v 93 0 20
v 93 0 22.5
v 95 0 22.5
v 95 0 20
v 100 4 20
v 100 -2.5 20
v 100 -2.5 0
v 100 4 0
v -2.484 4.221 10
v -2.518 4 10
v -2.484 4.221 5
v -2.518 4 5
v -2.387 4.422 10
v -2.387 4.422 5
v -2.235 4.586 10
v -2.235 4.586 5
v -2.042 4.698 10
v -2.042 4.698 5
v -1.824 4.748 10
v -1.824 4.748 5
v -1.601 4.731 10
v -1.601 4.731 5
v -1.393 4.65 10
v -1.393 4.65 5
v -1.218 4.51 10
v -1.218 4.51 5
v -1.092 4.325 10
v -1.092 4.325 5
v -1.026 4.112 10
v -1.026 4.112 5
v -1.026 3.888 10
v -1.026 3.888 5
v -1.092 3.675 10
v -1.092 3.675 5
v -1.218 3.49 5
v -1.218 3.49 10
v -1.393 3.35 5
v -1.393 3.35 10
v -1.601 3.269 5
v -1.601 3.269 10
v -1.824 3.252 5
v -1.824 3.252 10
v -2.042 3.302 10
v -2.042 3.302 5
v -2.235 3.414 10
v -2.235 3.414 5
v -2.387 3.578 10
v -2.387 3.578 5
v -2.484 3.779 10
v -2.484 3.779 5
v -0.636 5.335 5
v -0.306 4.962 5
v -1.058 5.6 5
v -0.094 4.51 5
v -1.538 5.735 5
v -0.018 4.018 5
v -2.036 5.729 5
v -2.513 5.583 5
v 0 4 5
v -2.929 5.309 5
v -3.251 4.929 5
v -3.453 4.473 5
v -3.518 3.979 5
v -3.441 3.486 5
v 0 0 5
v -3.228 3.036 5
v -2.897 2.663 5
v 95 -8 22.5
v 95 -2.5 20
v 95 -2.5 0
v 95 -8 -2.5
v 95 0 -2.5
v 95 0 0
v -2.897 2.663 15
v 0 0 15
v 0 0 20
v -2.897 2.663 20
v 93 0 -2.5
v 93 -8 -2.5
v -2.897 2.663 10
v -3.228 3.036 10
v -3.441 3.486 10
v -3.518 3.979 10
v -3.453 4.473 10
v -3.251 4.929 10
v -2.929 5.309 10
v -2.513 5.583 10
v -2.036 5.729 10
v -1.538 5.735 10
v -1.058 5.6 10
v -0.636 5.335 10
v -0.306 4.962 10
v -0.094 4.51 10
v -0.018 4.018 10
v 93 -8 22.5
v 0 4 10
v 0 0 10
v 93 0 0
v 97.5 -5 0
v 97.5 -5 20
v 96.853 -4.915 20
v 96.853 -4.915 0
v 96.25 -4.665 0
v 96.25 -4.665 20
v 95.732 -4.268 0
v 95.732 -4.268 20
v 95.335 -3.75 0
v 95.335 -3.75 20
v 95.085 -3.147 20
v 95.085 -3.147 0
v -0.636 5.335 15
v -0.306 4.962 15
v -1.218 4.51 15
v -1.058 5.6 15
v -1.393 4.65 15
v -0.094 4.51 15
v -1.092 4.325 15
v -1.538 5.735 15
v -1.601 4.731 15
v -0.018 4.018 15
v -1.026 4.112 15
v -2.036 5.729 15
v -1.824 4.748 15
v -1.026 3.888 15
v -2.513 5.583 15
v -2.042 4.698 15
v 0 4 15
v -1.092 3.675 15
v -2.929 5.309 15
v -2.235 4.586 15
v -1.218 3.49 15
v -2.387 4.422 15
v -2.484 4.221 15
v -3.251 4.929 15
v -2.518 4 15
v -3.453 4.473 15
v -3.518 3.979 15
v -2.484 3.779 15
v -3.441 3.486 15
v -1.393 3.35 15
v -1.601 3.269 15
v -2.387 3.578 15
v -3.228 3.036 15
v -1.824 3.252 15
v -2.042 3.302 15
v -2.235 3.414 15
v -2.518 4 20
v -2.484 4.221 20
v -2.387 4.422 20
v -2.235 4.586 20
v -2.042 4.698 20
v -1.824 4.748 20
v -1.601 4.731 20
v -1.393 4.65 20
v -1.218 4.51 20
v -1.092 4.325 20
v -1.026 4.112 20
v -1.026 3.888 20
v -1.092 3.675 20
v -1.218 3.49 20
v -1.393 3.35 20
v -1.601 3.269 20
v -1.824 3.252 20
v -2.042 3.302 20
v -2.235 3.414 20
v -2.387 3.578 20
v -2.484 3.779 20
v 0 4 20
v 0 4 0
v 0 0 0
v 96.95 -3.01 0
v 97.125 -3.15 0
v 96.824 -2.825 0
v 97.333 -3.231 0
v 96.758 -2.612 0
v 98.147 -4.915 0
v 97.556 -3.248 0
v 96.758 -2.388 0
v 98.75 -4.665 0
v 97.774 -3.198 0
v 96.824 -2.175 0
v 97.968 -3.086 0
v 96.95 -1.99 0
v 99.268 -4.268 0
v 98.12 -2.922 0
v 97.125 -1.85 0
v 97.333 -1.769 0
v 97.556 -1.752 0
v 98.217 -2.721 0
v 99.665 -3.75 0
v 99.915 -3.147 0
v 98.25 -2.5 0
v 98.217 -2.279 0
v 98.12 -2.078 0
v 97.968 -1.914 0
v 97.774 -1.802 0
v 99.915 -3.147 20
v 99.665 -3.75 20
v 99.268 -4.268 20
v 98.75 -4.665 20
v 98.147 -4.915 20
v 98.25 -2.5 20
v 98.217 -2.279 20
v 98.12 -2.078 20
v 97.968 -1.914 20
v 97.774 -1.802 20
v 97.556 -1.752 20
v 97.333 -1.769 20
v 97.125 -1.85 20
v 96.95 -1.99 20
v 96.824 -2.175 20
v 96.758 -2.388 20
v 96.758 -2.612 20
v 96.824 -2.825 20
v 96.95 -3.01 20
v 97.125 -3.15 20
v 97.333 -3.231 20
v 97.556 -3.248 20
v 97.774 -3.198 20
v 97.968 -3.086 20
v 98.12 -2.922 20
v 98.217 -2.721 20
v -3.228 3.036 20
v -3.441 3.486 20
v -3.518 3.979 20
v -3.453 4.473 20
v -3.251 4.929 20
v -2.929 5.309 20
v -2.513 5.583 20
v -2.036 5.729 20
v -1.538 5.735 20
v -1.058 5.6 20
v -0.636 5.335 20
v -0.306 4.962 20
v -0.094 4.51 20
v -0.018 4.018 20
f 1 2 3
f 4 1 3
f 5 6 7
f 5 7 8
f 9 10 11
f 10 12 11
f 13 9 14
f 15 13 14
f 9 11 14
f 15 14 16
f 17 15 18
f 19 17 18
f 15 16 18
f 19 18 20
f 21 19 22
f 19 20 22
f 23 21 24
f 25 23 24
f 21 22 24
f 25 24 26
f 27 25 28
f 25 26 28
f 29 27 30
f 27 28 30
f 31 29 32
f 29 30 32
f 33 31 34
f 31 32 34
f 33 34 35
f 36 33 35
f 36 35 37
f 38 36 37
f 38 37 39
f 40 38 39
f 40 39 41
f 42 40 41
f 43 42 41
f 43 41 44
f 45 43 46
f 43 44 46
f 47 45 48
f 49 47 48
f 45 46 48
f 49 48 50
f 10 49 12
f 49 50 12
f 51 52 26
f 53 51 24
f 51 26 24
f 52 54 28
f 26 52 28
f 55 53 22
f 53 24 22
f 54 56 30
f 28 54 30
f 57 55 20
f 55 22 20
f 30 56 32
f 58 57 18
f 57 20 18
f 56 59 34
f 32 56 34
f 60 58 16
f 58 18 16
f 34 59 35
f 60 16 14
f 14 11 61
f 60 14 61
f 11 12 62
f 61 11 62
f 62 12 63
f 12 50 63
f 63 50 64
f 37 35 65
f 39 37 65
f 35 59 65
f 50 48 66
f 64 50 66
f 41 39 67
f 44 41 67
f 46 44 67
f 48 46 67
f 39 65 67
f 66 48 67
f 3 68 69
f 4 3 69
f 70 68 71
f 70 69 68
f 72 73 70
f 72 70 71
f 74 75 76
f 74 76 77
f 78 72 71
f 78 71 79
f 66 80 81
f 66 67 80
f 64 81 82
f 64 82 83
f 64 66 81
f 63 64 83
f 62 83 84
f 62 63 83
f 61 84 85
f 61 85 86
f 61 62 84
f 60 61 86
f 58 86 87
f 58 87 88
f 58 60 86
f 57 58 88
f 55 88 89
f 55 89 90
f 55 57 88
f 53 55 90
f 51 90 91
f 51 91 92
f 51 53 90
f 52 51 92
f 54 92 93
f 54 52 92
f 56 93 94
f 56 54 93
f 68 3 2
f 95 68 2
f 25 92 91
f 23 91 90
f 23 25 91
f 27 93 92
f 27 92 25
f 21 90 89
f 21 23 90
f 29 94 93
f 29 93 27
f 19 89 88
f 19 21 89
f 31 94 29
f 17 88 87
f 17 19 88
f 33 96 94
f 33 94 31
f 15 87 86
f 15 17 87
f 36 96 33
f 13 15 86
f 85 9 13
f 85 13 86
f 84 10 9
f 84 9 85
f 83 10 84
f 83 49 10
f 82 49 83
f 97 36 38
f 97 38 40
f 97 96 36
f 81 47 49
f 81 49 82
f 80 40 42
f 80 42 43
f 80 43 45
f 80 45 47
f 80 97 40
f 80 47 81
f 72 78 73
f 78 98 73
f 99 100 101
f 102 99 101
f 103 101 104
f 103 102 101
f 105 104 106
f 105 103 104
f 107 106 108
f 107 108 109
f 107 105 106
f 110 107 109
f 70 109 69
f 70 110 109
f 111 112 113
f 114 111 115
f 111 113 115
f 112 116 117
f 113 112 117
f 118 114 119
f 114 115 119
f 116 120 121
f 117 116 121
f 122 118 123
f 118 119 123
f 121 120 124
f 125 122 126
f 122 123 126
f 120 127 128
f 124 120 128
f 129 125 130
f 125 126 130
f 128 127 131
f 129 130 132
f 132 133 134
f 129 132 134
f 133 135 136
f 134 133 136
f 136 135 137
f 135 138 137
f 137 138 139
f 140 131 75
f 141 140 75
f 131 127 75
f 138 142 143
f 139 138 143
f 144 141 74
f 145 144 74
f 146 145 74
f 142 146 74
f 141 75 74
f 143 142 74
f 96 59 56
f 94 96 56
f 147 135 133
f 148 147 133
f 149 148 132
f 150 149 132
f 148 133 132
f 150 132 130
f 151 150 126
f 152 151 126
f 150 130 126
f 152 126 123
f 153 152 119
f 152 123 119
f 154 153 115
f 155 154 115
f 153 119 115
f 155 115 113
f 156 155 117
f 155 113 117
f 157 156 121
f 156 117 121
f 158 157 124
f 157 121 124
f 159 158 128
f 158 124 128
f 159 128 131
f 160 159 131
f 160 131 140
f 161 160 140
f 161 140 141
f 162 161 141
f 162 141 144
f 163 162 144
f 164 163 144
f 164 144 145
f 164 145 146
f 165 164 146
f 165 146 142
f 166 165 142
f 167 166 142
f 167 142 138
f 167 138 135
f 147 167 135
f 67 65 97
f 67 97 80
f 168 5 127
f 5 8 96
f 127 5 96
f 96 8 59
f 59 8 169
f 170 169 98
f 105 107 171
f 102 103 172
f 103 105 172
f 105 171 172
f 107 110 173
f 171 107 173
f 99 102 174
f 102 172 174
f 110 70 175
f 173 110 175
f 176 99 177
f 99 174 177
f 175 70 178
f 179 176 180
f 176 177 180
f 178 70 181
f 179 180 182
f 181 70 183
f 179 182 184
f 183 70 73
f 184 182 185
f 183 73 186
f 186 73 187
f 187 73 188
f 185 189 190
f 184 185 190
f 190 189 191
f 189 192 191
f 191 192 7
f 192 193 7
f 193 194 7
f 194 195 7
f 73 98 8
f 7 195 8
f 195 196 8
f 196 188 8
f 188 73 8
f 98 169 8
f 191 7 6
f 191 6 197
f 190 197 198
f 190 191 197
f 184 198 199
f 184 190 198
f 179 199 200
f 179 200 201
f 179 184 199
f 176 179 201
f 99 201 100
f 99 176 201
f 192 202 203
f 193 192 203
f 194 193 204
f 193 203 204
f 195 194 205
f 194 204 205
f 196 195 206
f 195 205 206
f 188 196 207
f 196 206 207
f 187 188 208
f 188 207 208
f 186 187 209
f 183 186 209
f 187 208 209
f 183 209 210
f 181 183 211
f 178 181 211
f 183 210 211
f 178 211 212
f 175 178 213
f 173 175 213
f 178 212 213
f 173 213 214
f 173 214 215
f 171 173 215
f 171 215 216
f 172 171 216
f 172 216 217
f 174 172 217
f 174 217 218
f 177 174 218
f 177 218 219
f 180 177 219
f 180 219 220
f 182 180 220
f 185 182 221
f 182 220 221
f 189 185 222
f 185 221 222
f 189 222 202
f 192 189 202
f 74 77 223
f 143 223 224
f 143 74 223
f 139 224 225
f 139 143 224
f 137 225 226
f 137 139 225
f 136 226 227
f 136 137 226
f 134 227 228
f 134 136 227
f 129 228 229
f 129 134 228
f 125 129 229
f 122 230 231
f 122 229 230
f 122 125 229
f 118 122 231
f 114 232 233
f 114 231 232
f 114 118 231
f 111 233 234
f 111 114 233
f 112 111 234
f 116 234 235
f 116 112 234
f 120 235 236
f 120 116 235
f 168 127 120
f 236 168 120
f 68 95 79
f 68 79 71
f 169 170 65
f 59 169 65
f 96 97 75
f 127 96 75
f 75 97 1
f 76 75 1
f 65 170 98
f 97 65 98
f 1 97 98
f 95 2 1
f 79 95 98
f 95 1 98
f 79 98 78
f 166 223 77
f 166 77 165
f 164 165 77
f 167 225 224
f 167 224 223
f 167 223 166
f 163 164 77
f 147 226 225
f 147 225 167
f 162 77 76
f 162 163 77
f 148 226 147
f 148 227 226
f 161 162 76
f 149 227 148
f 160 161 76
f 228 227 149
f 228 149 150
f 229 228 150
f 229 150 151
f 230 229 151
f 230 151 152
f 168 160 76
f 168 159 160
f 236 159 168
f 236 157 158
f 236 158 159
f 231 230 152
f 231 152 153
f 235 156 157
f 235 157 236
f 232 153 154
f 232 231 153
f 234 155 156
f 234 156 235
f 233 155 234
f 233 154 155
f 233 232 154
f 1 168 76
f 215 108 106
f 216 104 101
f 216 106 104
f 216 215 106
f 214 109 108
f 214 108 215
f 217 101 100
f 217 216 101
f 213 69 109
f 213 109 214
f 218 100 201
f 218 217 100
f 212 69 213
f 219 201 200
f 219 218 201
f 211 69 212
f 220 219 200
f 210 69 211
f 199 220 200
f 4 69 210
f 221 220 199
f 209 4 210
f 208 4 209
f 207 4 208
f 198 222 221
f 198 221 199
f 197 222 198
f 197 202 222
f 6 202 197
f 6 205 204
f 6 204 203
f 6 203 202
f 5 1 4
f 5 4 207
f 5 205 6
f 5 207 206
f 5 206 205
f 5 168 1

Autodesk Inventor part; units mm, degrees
ref_plane "YZ Plane" through (0, 0, 0) normal (1, 0, 0) x (0, 1, 0)
ref_plane "XZ Plane" through (0, 0, 0) normal (0, 1, 0) x (-1, 0, 0)
sketch "Skizze1" plane through (0, 0, 0) normal (0, 0, 1) x (1, 0, 0)
  line L0 (0, 0) -> (100, 0)
  line L1 (100, 0) -> (100, 4)
  line L2 (100, 4) -> (0, 4)
  line L3 (0, 4) -> (0, 0)
  dimension "d0" = 100
  dimension "d1" = 4
extrude "Extrusion1" add sketch "Skizze1" along normal blind 20
sketch "Skizze2" plane through (0, 0, 0) normal (0, 0, -1) x (-1, 0, 0)
  line L0 (0, 4) -> (0, 0) projected
  line L1 (-100, 4) -> (0, 4) projected
  line L2 (0, 4) -> (2.5, 4) construction
  line L3 (1.7678, 5.7678) -> (1.7678, 5.75)
  arc A0 (2.8969, 2.663) -> (0.0178, 4) centre (1.7678, 4) ccw
  line L4 (0, 0) -> (3.0052, 2.7626)
  line L5 (0, 4) -> (0.0179, 4.0179)
  line L6 (1.7499, 5.7499) -> (1.7678, 5.7678)
  circle A1 centre (1.7678, 4) radius 0.75
  dimension "d4" = 2.5
  dimension "d6" = 3.5
  dimension "d9" = 1.5
extrude "Extrusion2" add sketch "Skizze2" against normal blind 20 contours L5 A0 L4 L0 | A1
sketch "Skizze3" plane through (0, 0, 0) normal (0, 0, -1) x (-1, 0, 0)
  point P0 (0, 0)
extrude "Extrusion3" cut sketch "Skizze2" against normal blind 20 contours A1
sketch "Skizze6" plane through (0, 0, 0) normal (0, -1, 0) x (1, 0, 0)
  line L0 (0, 0) -> (0, 20) projected
  line L1 (0, 20) -> (0, 15)
  line L2 (0, 15) -> (0, 10)
  line L3 (0, 10) -> (0, 5)
  line L4 (0, 5) -> (0, 0)
  line L5 (-3.5178, 0) -> (-0.0179, 0) projected
  line L6 (0, 0) -> (-3.5178, 0)
  line L7 (-3.5178, 0) -> (-3.5178, 5)
  line L8 (-3.5178, 0) -> (-3.5178, 20) projected
  line L9 (0, 5) -> (-3.5178, 5)
  line L10 (0, 15) -> (-3.5178, 15)
  line L11 (-3.5178, 15) -> (-3.5178, 10)
  line L12 (0, 10) -> (-3.5178, 10)
  point P0 (-3.0052, 0)
  dimension "d22" = 5
  dimension "d23" = 5
  dimension "d24" = 5
extrude "Extrusion5" cut sketch "Skizze6" against normal blind 50 contours L6 L5 L7 L9 L0 | L12 L8 L10 L0
sketch "Skizze7" plane through (100, 4, 20) normal (1, 0, 0) x (0, 0, -1)
  point P0 (20, -4)
sketch "Skizze10" plane through (0, 0, 20) normal (0, 0, 1) x (1, 0, 0)
  point P0 (0, 0)
sketch "Skizze11" plane through (0, 0, 20) normal (0, 0, 1) x (1, 0, 0)
  line L0 (0, 0) -> (100, 0) projected
  line L1 (100, 0) -> (95, 0)
  line L2 (95, 0) -> (95, -5)
  line L3 (95, -5) -> (100, -5)
  line L4 (100, -5) -> (100, 0)
  dimension "d28" = 5
  dimension "d29" = 5
extrude "Extrusion6" add sketch "Skizze11" against normal blind 20
sketch "Skizze12" plane through (0, 0, 20) normal (0, 0, 1) x (1, 0, 0)
  line L0 (100, 4) -> (100, -5) projected
  line L1 (100, -5) -> (97.5, -5)
  line L2 (100, -5) -> (95, -5) projected
  line L3 (97.5, -5) -> (97.5, -2.5)
  circle A0 centre (97.5, -2.5) radius 0.75
  point P0 (0, 0)
  dimension "d32" = 2.5
  dimension "d33" = 1.5
extrude "Extrusion7" cut sketch "Skizze12" against normal blind 20
fillet "Rundung1" radius 2.5 2 edges at (95, -5, 10) (100, -5, 10)
ref_plane "Arbeitsebene3" through (0, -4, 15) normal (0, -1, 0) x (1, 0, 0)
sketch "Skizze14" plane through (0, -4, 15) normal (0, -1, 0) x (1, 0, 0)
  line L0 (95, 5) -> (95, -15) projected
  line L1 (0, -15) -> (95, -15) projected
  line L2 (95, 5) -> (93, 5)
  line L3 (93, 5) -> (93, -15)
  line L4 (93, -15) -> (95, -15)
  line L5 (95, -15) -> (95, 5)
  line L6 (93, 5) -> (95, 5)
  line L7 (95, 5) -> (95, 7.5)
  line L8 (95, 7.5) -> (93, 7.5)
  line L9 (93, 7.5) -> (93, 5)
  line L10 (93, -15) -> (95, -15)
  line L11 (95, -15) -> (95, -17.5)
  line L12 (95, -17.5) -> (93, -17.5)
  line L13 (93, -17.5) -> (93, -15)
  dimension "d39" = 2
  dimension "d40" = 2
  dimension "d41" = 2.5
  dimension "d42" = 2.5
extrude "Extrusion9" add sketch "Skizze14" along normal mid plane 8
properties part number "Hebel_Klemme_unten"
